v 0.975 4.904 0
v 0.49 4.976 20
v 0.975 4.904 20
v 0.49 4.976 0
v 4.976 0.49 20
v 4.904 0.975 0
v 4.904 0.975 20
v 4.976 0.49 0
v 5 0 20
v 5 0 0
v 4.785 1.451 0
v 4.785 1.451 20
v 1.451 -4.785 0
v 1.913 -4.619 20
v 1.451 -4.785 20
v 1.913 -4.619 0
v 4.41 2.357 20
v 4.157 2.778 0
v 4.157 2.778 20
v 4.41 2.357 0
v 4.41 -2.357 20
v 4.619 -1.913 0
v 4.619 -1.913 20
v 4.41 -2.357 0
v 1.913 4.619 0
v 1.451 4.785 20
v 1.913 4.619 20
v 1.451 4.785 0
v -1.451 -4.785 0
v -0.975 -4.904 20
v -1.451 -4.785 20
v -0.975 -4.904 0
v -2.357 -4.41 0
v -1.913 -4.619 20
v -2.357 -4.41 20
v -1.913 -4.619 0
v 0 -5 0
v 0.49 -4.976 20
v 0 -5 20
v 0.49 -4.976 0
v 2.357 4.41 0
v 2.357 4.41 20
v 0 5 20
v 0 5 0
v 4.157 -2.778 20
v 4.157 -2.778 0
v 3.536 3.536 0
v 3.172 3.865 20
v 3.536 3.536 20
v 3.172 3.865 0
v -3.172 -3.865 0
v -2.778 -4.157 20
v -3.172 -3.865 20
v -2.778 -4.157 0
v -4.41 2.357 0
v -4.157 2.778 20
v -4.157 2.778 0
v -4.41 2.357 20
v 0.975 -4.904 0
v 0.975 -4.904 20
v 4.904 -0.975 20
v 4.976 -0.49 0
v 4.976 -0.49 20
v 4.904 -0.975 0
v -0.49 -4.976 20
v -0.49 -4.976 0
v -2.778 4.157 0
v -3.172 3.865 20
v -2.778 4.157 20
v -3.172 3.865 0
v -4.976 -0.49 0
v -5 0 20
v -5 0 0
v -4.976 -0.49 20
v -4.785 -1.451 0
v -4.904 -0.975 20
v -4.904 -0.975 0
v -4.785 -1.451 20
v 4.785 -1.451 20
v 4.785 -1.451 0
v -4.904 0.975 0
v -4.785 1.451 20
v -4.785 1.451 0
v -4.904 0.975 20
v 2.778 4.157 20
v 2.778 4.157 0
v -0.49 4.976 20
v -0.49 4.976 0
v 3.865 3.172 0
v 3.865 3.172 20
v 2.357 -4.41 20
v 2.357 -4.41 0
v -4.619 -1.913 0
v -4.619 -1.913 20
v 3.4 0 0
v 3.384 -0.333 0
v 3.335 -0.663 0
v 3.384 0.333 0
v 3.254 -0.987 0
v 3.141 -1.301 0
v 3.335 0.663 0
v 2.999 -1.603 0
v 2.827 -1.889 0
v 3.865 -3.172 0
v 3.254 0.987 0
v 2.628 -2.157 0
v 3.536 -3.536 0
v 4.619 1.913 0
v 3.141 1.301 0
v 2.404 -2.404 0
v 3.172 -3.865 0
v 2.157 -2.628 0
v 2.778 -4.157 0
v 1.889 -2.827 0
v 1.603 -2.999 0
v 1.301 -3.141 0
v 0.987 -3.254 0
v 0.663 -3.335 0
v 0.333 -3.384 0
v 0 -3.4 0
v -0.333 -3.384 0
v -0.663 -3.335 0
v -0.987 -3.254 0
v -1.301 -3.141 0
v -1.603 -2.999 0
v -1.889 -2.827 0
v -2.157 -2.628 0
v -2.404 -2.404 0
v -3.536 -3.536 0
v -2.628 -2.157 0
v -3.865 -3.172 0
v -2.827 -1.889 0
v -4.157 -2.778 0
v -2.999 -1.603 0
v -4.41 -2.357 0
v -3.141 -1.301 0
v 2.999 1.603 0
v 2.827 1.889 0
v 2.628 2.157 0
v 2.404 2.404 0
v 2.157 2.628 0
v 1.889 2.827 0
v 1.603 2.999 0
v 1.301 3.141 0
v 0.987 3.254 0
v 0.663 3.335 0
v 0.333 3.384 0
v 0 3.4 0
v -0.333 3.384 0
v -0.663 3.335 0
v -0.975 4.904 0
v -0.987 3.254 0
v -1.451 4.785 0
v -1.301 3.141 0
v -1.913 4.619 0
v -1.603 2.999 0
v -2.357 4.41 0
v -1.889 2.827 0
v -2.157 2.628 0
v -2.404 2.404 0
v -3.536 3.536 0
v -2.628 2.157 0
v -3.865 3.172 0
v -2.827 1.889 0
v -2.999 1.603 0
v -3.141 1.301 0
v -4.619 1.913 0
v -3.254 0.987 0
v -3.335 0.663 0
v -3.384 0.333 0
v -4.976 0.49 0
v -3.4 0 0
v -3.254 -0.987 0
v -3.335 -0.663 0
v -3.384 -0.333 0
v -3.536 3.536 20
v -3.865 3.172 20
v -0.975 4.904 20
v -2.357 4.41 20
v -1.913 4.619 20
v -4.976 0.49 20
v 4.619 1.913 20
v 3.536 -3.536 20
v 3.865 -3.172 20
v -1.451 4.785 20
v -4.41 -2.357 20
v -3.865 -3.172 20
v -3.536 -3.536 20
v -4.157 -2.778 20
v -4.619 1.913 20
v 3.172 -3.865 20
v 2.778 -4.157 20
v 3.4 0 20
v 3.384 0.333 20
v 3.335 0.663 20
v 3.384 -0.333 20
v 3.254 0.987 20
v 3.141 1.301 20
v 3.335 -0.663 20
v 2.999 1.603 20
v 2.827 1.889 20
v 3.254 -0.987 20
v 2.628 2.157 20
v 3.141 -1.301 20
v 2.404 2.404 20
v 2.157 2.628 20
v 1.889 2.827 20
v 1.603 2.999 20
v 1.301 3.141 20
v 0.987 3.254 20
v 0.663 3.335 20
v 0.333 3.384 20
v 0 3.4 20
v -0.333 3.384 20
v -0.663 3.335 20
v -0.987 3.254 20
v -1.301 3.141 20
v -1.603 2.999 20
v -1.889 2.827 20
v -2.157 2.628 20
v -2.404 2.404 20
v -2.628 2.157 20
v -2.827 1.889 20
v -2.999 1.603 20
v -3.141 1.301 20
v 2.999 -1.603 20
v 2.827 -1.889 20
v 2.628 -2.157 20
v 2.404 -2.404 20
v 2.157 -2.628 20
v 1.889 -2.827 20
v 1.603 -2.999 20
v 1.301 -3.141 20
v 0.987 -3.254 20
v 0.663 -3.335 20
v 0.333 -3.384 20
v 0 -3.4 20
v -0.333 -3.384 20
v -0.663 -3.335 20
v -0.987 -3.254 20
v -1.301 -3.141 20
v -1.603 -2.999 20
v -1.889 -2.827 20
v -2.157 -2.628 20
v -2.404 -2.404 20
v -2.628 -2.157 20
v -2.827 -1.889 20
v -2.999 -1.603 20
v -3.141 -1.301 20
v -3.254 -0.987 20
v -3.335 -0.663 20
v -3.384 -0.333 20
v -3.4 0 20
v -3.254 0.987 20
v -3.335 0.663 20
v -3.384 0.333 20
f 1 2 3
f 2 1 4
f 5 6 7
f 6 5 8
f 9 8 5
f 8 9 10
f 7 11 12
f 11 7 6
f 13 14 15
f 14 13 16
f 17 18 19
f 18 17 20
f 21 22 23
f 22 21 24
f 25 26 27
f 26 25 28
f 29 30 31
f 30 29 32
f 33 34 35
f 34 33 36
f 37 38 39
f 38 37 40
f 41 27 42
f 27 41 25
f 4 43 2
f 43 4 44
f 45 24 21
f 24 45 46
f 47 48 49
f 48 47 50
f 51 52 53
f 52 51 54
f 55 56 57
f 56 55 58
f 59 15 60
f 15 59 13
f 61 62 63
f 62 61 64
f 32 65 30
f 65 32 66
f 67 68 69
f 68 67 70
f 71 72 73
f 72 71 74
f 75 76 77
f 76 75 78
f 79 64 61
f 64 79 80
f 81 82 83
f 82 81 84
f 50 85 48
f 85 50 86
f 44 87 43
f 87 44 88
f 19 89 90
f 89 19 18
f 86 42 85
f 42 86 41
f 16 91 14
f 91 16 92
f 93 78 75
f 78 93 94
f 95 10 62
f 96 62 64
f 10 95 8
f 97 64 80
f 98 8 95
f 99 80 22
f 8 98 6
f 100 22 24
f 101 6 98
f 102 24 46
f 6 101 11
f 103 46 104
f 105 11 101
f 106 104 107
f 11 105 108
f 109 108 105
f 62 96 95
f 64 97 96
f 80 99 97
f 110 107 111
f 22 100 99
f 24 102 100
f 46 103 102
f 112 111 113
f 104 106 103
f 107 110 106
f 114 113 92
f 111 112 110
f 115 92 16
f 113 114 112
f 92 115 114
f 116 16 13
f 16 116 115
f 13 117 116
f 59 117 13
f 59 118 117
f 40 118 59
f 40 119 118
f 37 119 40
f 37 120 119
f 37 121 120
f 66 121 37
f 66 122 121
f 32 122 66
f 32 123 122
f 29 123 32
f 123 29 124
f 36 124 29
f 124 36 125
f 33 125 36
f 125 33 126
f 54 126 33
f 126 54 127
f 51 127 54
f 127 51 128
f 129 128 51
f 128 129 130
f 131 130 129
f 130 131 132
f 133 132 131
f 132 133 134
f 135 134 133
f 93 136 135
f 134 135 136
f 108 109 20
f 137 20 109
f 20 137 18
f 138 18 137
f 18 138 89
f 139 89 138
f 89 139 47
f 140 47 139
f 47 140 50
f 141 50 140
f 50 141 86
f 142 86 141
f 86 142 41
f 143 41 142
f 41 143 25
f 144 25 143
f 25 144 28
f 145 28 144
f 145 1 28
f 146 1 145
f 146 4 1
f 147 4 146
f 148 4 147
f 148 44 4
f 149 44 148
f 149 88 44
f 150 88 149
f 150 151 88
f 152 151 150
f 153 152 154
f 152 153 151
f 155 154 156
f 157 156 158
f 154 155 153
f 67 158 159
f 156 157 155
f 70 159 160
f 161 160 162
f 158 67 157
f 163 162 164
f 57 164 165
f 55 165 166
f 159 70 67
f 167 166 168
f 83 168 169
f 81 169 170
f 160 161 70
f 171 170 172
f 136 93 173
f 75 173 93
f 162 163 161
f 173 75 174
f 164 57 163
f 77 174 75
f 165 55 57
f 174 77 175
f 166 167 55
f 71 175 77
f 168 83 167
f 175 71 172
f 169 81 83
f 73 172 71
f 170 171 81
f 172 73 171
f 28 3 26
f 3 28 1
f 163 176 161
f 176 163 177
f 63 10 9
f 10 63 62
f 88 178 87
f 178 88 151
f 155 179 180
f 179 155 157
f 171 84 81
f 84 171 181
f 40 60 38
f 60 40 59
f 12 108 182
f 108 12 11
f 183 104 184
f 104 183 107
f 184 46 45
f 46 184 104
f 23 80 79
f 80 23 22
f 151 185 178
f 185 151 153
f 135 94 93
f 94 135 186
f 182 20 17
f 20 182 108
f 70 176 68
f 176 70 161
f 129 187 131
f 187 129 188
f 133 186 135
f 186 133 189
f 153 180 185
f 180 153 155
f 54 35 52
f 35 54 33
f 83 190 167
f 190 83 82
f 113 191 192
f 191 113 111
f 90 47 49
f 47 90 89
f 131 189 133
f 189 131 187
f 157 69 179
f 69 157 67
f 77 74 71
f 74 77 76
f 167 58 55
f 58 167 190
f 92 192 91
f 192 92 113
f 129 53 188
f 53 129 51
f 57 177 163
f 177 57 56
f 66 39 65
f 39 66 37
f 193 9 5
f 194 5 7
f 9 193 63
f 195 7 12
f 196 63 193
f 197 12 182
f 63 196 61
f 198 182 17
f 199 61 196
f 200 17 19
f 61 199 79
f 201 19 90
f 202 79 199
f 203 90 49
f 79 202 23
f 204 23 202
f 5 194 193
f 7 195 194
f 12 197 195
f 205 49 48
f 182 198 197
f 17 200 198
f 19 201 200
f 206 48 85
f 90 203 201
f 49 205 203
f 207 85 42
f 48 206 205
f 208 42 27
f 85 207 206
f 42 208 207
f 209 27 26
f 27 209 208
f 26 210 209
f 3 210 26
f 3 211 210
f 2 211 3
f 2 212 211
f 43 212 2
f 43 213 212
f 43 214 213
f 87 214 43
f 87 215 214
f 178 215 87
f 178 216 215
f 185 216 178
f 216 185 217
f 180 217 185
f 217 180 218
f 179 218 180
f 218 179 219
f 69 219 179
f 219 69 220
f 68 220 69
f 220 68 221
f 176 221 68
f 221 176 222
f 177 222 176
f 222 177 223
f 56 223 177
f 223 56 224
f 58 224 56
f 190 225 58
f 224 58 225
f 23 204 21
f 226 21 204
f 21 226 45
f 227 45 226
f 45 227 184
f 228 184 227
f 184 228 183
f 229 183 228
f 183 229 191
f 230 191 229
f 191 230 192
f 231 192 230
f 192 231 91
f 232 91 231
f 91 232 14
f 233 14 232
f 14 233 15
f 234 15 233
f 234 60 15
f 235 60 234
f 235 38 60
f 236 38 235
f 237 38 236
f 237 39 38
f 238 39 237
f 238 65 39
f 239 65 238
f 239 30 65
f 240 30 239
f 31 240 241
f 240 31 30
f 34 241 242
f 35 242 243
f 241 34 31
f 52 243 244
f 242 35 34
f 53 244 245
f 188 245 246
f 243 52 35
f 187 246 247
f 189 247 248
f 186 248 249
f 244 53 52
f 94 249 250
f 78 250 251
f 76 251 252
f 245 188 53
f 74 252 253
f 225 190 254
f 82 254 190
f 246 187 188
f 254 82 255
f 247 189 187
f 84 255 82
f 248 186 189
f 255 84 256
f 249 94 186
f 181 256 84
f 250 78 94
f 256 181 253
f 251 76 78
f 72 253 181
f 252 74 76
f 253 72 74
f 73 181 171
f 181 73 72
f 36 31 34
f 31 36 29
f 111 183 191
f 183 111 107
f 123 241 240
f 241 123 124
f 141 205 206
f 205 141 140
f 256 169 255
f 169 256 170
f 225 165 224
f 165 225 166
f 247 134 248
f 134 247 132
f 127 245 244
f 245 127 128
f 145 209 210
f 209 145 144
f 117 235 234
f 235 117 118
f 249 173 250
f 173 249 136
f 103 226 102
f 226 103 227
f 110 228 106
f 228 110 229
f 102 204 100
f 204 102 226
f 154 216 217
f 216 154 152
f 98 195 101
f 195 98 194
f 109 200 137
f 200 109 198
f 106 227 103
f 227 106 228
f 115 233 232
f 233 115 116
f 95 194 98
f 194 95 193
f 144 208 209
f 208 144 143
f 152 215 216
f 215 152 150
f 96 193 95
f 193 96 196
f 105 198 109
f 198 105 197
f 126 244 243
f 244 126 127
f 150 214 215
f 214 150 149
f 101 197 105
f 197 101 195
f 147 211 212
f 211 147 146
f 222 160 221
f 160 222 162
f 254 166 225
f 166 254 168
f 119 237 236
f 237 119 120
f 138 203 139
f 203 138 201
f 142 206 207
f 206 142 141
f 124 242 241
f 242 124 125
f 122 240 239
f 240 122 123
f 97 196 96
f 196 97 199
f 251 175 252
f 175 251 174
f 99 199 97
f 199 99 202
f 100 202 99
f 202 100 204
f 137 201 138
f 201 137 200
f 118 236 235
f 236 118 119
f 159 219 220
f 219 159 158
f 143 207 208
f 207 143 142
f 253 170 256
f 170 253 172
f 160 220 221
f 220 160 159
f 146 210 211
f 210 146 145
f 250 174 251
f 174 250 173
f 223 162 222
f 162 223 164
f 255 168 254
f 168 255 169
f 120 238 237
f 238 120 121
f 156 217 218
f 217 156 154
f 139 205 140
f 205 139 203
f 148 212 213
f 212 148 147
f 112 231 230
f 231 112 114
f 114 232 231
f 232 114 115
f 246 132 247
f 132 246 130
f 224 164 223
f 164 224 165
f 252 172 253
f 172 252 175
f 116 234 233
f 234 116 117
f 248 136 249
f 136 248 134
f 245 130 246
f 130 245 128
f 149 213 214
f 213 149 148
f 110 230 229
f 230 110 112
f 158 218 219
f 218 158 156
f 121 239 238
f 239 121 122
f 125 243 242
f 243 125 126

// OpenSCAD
// Lab Funnel Design (Corrected)
// Units: millimetres
// Orientation: Upright, wide opening at top, rests on XY plane at z=0.

// --- Dimensions ---
// Spout (Tube)
$spout_outer_diameter = 10;
$spout_inner_diameter = 6.8; // 10 - 2*1.6
$spout_length = 20;

// Cone (Funnel)
$cone_bottom_diameter = 10; // Matches spout outer diameter at z=20
$cone_top_diameter = 60;
$cone_height = 30; // From z=20 to z=50

// Wall Thickness
$wall_thickness = 1.6;

// Resolution for curved surfaces
$fn = 64;

// --- Helper Functions ---
// Creates a hollow cylinder (tube)
module hollow_cylinder(outer_d, inner_d, h) {
    difference() {
        cylinder(h = h, d = outer_d, $fn = $fn);
        cylinder(h = h, d = inner_d, $fn = $fn);
    }
}

// Creates a hollow cone (frustum)
// bottom_d: diameter at the smaller end (z=0 relative to cone)
// top_d: diameter at the larger end (z=height relative to cone)
module hollow_cone(bottom_d, top_d, h) {
    difference() {
        // Outer Cone
        // Polygon defines the profile: width at y=0 is bottom_d, width at y=h is top_d
        // Points: (-w/2, 0), (w/2, 0), (W/2, h), (-W/2, h)
        linear_extrude(height = h, center = true, convexity = 3) {
            polygon(points = [
                [-bottom_d/2, 0], 
                [bottom_d/2, 0], 
                [top_d/2, h], 
                [-top_d/2, h]
            ]);
        }
        
        // Inner Cone (Hole)
        linear_extrude(height = h, center = true, convexity = 3) {
            polygon(points = [
                [-bottom_d/2, 0], 
                [bottom_d/2, 0], 
                [top_d/2, h], 
                [-top_d/2, h]
            ]);
        }
    }
}

// --- Main Assembly ---
// The funnel rests on the XY plane at z=0.
// The spout runs from z=0 to z=20.
// The cone runs from z=20 to z=50.

translate([0, 0, 0]) {
    // 1. Build the Spout (Tube)
    // Outer diameter 10mm, Inner 6.8mm, Height 20mm
    hollow_cylinder(
        outer_d = $spout_outer_diameter,
        inner_d = $spout_inner_diameter,
        h = $spout_length
    );

    // 2. Build the Cone (Funnel)
    // Positioned starting at z = $spout_length (20mm)
    // Bottom diameter (at z=20) = 10mm
    // Top diameter (at z=50) = 60mm
    translate([0, 0, $spout_length]) {
        hollow_cone(
            bottom_d = $cone_bottom_diameter,
            top_d = $cone_top_diameter,
            h = $cone_height
        );
    }
}
